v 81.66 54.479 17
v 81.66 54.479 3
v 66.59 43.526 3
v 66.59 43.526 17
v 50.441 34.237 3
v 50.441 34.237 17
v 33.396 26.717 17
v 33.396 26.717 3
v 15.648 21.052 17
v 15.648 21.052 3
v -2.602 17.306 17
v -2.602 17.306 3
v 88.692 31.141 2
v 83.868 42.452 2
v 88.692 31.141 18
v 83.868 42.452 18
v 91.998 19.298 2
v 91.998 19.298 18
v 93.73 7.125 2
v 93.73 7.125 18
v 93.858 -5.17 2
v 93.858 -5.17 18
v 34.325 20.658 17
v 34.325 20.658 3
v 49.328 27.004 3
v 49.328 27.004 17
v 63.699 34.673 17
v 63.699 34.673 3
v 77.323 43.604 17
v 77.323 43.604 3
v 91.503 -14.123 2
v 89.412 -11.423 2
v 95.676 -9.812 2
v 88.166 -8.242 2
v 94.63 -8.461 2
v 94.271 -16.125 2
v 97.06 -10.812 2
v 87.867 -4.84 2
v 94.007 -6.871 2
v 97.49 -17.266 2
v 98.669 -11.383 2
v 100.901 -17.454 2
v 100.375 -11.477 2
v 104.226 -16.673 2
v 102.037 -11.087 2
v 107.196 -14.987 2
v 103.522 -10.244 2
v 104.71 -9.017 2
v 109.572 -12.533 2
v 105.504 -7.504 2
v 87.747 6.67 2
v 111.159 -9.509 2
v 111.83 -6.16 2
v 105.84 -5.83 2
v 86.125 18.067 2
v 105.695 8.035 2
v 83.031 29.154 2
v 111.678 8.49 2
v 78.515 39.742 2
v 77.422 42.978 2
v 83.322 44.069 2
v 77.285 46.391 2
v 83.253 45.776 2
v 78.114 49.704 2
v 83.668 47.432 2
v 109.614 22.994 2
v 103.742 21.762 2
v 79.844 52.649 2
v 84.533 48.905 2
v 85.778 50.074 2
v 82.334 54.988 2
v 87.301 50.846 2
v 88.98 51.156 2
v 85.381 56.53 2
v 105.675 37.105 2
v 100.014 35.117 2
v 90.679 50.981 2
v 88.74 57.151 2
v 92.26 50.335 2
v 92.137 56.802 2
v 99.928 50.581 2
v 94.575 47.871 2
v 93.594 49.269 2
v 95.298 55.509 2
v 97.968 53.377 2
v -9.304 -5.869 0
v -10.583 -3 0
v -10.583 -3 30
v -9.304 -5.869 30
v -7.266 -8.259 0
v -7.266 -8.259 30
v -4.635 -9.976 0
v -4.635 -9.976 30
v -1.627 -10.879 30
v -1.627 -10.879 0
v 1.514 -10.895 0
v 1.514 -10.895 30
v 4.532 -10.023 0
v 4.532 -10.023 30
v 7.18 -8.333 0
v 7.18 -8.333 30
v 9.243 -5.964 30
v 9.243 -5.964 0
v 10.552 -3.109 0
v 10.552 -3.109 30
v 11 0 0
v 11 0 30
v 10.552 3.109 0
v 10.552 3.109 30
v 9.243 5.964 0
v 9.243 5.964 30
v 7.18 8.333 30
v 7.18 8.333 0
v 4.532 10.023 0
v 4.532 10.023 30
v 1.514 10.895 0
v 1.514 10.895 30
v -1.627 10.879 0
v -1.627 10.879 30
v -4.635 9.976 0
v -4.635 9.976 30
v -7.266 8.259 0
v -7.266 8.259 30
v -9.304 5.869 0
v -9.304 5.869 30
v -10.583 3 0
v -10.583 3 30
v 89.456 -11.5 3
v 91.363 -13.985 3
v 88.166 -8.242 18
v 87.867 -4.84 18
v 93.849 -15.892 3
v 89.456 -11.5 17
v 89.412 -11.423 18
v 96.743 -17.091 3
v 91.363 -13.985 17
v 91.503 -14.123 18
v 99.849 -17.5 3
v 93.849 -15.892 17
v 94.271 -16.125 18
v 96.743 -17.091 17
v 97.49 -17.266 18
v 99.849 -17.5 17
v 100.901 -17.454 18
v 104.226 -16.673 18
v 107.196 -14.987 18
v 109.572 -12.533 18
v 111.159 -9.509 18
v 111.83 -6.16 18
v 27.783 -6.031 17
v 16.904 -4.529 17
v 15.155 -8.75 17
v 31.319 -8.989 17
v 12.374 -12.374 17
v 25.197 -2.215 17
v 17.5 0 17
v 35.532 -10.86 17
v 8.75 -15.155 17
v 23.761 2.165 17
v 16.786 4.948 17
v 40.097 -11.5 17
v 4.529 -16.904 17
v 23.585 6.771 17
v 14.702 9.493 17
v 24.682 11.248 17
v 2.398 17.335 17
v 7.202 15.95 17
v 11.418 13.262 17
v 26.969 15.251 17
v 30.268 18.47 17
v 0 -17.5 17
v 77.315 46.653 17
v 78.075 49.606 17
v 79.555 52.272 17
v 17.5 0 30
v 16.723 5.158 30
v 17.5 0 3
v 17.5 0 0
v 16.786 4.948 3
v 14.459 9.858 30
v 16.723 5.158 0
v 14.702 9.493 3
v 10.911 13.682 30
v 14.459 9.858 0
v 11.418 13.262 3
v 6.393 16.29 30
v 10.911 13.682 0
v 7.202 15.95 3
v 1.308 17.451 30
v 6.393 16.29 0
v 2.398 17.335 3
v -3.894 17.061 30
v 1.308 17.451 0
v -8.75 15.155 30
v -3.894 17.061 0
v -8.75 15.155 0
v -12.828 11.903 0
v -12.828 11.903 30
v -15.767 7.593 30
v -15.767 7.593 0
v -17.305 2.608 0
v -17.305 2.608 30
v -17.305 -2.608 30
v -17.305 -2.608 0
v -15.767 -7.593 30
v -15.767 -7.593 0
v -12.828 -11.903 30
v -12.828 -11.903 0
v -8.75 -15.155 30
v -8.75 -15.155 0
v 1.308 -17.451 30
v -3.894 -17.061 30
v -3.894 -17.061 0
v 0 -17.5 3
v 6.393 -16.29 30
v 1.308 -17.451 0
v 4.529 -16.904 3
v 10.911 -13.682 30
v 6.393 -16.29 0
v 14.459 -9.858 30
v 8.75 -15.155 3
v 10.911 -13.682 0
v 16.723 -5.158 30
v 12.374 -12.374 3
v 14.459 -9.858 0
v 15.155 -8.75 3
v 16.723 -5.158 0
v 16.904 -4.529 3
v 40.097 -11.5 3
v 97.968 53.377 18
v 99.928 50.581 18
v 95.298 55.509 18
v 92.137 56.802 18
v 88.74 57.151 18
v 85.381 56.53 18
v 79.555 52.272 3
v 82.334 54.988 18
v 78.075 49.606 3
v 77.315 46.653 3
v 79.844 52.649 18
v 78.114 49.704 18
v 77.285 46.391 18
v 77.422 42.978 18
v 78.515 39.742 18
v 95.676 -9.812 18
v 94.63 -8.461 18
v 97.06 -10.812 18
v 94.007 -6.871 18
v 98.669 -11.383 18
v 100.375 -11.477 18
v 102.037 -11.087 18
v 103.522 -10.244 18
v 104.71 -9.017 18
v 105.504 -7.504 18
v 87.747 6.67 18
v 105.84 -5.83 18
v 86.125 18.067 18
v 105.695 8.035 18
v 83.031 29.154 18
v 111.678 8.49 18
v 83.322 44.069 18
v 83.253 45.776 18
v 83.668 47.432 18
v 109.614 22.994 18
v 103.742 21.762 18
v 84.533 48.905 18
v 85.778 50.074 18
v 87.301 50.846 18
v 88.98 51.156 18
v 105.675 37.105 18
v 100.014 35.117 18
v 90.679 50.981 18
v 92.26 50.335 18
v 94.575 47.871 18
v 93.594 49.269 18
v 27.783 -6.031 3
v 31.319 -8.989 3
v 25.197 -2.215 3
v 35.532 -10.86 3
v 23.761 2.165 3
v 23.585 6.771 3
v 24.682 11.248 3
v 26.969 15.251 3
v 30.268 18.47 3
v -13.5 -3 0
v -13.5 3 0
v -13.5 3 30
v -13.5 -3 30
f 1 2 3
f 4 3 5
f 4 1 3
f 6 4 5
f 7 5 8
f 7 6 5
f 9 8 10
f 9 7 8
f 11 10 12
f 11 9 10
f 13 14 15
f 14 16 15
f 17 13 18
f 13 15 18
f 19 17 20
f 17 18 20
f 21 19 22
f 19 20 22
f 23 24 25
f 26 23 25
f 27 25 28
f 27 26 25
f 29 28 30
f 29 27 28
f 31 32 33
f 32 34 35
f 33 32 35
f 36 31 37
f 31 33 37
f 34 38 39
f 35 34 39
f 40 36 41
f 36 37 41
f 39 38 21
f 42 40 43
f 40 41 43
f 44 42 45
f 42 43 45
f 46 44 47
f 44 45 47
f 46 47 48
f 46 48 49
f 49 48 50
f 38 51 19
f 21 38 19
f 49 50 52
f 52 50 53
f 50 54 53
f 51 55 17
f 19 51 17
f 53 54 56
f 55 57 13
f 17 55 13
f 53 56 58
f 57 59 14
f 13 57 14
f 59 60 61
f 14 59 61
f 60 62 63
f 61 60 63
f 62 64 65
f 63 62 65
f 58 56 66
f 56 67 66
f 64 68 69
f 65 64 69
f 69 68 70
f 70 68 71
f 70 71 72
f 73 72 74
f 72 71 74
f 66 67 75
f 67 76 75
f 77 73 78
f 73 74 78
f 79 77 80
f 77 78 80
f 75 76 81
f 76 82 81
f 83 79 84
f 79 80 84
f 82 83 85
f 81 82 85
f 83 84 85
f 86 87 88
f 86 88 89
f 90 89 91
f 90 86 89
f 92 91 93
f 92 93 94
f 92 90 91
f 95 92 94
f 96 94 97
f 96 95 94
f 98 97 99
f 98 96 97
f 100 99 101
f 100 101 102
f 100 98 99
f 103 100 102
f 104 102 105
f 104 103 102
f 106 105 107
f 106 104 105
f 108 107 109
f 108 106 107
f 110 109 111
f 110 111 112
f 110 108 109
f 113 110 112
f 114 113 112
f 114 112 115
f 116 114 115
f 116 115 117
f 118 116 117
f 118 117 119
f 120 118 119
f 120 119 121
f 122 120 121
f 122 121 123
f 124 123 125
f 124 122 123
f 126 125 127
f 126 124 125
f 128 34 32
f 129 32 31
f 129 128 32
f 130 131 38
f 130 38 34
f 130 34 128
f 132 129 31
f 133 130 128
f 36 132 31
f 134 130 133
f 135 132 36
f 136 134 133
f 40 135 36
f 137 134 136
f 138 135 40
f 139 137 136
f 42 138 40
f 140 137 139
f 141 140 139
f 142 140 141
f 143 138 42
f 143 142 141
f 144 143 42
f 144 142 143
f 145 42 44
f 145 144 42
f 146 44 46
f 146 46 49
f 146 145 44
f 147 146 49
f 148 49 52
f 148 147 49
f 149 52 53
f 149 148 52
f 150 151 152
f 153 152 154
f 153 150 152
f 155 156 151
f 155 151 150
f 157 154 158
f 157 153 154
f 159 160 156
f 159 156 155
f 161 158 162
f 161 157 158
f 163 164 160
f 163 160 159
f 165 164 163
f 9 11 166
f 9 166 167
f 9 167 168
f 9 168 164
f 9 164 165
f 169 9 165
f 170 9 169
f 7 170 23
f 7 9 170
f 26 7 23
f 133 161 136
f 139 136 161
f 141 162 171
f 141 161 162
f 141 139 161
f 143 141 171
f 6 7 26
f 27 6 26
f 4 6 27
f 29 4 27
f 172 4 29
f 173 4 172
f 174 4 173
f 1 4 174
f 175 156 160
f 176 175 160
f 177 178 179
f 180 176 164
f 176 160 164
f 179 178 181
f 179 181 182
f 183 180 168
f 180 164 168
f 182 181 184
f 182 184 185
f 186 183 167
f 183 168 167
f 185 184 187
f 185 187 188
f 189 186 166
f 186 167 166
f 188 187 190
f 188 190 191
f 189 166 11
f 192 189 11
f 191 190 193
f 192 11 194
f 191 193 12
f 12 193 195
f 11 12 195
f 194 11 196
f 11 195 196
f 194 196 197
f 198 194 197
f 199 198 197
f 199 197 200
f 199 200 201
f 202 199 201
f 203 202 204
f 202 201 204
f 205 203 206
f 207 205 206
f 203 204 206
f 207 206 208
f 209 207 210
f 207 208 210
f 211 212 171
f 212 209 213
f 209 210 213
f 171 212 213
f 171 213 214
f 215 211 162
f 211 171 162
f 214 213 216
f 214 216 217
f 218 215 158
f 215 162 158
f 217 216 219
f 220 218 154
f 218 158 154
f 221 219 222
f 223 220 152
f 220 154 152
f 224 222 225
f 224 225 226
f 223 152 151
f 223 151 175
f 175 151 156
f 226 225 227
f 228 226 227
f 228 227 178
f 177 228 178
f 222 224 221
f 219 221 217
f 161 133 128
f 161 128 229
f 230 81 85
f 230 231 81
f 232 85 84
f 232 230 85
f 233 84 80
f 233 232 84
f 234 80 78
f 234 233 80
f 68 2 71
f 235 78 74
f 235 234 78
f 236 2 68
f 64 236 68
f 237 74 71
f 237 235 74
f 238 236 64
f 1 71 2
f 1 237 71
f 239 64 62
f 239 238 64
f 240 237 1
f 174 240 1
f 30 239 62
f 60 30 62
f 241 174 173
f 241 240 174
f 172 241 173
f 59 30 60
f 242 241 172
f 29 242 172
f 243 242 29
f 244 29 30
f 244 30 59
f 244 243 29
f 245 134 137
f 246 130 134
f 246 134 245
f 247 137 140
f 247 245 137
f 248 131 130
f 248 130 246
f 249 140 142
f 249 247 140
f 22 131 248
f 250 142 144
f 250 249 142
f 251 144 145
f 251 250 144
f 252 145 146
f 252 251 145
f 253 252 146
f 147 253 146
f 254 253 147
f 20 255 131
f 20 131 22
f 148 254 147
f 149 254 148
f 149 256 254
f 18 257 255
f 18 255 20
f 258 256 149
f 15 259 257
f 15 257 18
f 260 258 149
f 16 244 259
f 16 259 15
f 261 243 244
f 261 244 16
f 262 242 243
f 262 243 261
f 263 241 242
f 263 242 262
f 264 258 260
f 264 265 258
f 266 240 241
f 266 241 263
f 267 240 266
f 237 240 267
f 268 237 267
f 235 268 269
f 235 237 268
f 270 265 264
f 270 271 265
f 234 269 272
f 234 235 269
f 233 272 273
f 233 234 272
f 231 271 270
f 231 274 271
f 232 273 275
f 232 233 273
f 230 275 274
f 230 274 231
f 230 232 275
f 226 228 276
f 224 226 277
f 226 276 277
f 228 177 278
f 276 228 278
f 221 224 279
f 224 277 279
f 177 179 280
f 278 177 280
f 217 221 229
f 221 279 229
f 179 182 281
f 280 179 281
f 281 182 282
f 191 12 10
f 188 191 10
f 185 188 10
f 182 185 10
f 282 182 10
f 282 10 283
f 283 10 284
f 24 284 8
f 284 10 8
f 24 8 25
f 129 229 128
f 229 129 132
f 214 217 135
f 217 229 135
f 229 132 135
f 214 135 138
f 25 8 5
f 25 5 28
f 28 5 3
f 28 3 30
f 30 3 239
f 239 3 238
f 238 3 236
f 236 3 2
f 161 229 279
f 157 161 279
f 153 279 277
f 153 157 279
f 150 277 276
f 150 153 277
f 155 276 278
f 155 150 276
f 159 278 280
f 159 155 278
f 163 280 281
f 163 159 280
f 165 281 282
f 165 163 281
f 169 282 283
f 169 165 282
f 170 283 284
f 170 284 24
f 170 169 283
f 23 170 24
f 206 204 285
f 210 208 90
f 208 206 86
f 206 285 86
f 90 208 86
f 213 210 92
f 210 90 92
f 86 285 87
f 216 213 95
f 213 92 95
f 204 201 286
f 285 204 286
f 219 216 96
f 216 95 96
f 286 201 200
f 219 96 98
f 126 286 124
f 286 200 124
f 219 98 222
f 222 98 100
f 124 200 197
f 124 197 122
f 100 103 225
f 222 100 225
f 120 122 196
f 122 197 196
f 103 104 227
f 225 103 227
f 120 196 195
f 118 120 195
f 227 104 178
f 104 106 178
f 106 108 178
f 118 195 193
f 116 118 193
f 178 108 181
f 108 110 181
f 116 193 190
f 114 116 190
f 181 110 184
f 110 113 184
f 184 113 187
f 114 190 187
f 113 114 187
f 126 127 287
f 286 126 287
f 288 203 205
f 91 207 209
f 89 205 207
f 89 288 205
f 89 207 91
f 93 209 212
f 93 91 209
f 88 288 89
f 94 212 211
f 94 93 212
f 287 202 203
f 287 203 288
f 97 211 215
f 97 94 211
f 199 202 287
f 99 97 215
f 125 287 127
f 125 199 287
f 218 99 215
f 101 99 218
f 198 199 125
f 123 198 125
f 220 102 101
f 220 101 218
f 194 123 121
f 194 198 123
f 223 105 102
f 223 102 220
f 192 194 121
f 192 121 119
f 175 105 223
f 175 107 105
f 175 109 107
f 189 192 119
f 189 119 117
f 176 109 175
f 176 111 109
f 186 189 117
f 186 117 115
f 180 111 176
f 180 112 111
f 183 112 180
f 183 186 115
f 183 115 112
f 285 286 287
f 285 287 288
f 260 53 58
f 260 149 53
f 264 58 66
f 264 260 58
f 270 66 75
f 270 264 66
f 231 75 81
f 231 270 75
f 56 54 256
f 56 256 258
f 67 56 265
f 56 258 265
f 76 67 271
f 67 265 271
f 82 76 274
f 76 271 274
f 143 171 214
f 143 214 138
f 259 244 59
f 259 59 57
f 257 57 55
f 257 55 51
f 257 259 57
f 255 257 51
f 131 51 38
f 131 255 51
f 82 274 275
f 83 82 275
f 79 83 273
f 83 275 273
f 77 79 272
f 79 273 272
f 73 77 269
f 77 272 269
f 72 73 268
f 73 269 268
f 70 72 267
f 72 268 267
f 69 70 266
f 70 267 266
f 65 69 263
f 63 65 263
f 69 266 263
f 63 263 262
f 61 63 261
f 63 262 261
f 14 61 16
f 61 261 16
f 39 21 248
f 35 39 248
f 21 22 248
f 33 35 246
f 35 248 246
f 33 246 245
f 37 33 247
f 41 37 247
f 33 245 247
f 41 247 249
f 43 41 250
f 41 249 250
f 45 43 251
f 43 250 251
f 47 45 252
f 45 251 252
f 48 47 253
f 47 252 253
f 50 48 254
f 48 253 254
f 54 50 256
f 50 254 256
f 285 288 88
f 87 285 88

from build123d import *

# Parameters (mm, degrees)
SKETCH1_R           = 17.5
BOSS_EXTRUDE1_DEPTH = 30
BOSS_EXTRUDE2_DEPTH = 7
BOSS_EXTRUDE3_DEPTH = 8


with BuildPart() as part:
    # Sketch1 → Boss-Extrude1 (new body)
    with BuildSketch(Plane.XY):
        Circle(SKETCH1_R)
        with BuildLine():
            Line((-10.583005244, 3), (-13.5, 3))
            Line((-13.5, 3), (-13.5, -3))
            Line((-13.5, -3), (-10.583005244, -3))
            ThreePointArc((-10.583005244, -3), (11, 0), (-10.583005244, 3))
        make_face(mode=Mode.SUBTRACT)
    extrude(amount=BOSS_EXTRUDE1_DEPTH)

    # Sketch2 → Boss-Extrude2 (add, symmetric)
    with BuildSketch(Plane.XY.offset(10)):
        with BuildLine():
            ThreePointArc((-2.601595129, 17.305539656), (17.451317199, 1.304426314), (0, -17.5))
            Line((0, -17.5), (99.848635444, -17.5))
            ThreePointArc((99.848635444, -17.5), (93.848635444, -15.892304845), (89.456330598, -11.5))
            Line((89.456330598, -11.5), (40.096746205, -11.5))
            ThreePointArc((40.096746205, -11.5), (23.76101461, 2.164876864), (34.325225686, 20.65764385))
            ThreePointArc((34.325225686, 20.65764385), (56.599943686, 30.676937705), (77.322925322, 43.603938264))
            ThreePointArc((77.322925322, 43.603938264), (78.075047047, 49.606129473), (81.659593785, 54.478809544))
            ThreePointArc((81.659593785, 54.478809544), (42.018242639, 30.249770758), (-2.601595129, 17.305539656))
        make_face()
    extrude(amount=BOSS_EXTRUDE2_DEPTH, both=True)

    # Sketch2<3> → Boss-Extrude3 (add, symmetric)
    with BuildSketch(Plane.XY.offset(10)):
        with BuildLine():
            ThreePointArc((89.456330598, -11.5), (93.848635444, -15.892304845), (99.848635444, -17.5))
            ThreePointArc((99.848635444, -17.5), (108.097271695, -14.215503428), (111.830471697, -6.16))
            ThreePointArc((111.830471697, -6.16), (109.614266096, 22.993752808), (99.928029407, 50.580519361))
            ThreePointArc((99.928029407, 50.580519361), (91.725745624, 56.896957805), (81.659593785, 54.478809544))
            ThreePointArc((81.659593785, 54.478809544), (78.075047047, 49.606129473), (77.322925322, 43.603938264))
            ThreePointArc((77.322925322, 43.603938264), (77.75512848, 41.622342022), (78.514880248, 39.741836641))
            ThreePointArc((78.514880248, 39.741836641), (86.12549479, 18.066520063), (87.866799191, -4.84))
            ThreePointArc((87.866799191, -4.84), (88.176469943, -8.285776826), (89.456330598, -11.5))
        make_face()
        with BuildLine():
            ThreePointArc((105.83955357, -5.83), (99.518635444, -11.490918127), (93.857717317, -5.17))
            ThreePointArc((93.857717317, -5.17), (91.997687616, 19.29832825), (83.868167538, 42.451507321))
            ThreePointArc((83.868167538, 42.451507321), (86.511784148, 50.514465291), (94.574742117, 47.870848681))
            ThreePointArc((94.574742117, 47.870848681), (103.74207327, 21.761944622), (105.83955357, -5.83))
        make_face(mode=Mode.SUBTRACT)
    extrude(amount=BOSS_EXTRUDE3_DEPTH, both=True)


solid = part.part
